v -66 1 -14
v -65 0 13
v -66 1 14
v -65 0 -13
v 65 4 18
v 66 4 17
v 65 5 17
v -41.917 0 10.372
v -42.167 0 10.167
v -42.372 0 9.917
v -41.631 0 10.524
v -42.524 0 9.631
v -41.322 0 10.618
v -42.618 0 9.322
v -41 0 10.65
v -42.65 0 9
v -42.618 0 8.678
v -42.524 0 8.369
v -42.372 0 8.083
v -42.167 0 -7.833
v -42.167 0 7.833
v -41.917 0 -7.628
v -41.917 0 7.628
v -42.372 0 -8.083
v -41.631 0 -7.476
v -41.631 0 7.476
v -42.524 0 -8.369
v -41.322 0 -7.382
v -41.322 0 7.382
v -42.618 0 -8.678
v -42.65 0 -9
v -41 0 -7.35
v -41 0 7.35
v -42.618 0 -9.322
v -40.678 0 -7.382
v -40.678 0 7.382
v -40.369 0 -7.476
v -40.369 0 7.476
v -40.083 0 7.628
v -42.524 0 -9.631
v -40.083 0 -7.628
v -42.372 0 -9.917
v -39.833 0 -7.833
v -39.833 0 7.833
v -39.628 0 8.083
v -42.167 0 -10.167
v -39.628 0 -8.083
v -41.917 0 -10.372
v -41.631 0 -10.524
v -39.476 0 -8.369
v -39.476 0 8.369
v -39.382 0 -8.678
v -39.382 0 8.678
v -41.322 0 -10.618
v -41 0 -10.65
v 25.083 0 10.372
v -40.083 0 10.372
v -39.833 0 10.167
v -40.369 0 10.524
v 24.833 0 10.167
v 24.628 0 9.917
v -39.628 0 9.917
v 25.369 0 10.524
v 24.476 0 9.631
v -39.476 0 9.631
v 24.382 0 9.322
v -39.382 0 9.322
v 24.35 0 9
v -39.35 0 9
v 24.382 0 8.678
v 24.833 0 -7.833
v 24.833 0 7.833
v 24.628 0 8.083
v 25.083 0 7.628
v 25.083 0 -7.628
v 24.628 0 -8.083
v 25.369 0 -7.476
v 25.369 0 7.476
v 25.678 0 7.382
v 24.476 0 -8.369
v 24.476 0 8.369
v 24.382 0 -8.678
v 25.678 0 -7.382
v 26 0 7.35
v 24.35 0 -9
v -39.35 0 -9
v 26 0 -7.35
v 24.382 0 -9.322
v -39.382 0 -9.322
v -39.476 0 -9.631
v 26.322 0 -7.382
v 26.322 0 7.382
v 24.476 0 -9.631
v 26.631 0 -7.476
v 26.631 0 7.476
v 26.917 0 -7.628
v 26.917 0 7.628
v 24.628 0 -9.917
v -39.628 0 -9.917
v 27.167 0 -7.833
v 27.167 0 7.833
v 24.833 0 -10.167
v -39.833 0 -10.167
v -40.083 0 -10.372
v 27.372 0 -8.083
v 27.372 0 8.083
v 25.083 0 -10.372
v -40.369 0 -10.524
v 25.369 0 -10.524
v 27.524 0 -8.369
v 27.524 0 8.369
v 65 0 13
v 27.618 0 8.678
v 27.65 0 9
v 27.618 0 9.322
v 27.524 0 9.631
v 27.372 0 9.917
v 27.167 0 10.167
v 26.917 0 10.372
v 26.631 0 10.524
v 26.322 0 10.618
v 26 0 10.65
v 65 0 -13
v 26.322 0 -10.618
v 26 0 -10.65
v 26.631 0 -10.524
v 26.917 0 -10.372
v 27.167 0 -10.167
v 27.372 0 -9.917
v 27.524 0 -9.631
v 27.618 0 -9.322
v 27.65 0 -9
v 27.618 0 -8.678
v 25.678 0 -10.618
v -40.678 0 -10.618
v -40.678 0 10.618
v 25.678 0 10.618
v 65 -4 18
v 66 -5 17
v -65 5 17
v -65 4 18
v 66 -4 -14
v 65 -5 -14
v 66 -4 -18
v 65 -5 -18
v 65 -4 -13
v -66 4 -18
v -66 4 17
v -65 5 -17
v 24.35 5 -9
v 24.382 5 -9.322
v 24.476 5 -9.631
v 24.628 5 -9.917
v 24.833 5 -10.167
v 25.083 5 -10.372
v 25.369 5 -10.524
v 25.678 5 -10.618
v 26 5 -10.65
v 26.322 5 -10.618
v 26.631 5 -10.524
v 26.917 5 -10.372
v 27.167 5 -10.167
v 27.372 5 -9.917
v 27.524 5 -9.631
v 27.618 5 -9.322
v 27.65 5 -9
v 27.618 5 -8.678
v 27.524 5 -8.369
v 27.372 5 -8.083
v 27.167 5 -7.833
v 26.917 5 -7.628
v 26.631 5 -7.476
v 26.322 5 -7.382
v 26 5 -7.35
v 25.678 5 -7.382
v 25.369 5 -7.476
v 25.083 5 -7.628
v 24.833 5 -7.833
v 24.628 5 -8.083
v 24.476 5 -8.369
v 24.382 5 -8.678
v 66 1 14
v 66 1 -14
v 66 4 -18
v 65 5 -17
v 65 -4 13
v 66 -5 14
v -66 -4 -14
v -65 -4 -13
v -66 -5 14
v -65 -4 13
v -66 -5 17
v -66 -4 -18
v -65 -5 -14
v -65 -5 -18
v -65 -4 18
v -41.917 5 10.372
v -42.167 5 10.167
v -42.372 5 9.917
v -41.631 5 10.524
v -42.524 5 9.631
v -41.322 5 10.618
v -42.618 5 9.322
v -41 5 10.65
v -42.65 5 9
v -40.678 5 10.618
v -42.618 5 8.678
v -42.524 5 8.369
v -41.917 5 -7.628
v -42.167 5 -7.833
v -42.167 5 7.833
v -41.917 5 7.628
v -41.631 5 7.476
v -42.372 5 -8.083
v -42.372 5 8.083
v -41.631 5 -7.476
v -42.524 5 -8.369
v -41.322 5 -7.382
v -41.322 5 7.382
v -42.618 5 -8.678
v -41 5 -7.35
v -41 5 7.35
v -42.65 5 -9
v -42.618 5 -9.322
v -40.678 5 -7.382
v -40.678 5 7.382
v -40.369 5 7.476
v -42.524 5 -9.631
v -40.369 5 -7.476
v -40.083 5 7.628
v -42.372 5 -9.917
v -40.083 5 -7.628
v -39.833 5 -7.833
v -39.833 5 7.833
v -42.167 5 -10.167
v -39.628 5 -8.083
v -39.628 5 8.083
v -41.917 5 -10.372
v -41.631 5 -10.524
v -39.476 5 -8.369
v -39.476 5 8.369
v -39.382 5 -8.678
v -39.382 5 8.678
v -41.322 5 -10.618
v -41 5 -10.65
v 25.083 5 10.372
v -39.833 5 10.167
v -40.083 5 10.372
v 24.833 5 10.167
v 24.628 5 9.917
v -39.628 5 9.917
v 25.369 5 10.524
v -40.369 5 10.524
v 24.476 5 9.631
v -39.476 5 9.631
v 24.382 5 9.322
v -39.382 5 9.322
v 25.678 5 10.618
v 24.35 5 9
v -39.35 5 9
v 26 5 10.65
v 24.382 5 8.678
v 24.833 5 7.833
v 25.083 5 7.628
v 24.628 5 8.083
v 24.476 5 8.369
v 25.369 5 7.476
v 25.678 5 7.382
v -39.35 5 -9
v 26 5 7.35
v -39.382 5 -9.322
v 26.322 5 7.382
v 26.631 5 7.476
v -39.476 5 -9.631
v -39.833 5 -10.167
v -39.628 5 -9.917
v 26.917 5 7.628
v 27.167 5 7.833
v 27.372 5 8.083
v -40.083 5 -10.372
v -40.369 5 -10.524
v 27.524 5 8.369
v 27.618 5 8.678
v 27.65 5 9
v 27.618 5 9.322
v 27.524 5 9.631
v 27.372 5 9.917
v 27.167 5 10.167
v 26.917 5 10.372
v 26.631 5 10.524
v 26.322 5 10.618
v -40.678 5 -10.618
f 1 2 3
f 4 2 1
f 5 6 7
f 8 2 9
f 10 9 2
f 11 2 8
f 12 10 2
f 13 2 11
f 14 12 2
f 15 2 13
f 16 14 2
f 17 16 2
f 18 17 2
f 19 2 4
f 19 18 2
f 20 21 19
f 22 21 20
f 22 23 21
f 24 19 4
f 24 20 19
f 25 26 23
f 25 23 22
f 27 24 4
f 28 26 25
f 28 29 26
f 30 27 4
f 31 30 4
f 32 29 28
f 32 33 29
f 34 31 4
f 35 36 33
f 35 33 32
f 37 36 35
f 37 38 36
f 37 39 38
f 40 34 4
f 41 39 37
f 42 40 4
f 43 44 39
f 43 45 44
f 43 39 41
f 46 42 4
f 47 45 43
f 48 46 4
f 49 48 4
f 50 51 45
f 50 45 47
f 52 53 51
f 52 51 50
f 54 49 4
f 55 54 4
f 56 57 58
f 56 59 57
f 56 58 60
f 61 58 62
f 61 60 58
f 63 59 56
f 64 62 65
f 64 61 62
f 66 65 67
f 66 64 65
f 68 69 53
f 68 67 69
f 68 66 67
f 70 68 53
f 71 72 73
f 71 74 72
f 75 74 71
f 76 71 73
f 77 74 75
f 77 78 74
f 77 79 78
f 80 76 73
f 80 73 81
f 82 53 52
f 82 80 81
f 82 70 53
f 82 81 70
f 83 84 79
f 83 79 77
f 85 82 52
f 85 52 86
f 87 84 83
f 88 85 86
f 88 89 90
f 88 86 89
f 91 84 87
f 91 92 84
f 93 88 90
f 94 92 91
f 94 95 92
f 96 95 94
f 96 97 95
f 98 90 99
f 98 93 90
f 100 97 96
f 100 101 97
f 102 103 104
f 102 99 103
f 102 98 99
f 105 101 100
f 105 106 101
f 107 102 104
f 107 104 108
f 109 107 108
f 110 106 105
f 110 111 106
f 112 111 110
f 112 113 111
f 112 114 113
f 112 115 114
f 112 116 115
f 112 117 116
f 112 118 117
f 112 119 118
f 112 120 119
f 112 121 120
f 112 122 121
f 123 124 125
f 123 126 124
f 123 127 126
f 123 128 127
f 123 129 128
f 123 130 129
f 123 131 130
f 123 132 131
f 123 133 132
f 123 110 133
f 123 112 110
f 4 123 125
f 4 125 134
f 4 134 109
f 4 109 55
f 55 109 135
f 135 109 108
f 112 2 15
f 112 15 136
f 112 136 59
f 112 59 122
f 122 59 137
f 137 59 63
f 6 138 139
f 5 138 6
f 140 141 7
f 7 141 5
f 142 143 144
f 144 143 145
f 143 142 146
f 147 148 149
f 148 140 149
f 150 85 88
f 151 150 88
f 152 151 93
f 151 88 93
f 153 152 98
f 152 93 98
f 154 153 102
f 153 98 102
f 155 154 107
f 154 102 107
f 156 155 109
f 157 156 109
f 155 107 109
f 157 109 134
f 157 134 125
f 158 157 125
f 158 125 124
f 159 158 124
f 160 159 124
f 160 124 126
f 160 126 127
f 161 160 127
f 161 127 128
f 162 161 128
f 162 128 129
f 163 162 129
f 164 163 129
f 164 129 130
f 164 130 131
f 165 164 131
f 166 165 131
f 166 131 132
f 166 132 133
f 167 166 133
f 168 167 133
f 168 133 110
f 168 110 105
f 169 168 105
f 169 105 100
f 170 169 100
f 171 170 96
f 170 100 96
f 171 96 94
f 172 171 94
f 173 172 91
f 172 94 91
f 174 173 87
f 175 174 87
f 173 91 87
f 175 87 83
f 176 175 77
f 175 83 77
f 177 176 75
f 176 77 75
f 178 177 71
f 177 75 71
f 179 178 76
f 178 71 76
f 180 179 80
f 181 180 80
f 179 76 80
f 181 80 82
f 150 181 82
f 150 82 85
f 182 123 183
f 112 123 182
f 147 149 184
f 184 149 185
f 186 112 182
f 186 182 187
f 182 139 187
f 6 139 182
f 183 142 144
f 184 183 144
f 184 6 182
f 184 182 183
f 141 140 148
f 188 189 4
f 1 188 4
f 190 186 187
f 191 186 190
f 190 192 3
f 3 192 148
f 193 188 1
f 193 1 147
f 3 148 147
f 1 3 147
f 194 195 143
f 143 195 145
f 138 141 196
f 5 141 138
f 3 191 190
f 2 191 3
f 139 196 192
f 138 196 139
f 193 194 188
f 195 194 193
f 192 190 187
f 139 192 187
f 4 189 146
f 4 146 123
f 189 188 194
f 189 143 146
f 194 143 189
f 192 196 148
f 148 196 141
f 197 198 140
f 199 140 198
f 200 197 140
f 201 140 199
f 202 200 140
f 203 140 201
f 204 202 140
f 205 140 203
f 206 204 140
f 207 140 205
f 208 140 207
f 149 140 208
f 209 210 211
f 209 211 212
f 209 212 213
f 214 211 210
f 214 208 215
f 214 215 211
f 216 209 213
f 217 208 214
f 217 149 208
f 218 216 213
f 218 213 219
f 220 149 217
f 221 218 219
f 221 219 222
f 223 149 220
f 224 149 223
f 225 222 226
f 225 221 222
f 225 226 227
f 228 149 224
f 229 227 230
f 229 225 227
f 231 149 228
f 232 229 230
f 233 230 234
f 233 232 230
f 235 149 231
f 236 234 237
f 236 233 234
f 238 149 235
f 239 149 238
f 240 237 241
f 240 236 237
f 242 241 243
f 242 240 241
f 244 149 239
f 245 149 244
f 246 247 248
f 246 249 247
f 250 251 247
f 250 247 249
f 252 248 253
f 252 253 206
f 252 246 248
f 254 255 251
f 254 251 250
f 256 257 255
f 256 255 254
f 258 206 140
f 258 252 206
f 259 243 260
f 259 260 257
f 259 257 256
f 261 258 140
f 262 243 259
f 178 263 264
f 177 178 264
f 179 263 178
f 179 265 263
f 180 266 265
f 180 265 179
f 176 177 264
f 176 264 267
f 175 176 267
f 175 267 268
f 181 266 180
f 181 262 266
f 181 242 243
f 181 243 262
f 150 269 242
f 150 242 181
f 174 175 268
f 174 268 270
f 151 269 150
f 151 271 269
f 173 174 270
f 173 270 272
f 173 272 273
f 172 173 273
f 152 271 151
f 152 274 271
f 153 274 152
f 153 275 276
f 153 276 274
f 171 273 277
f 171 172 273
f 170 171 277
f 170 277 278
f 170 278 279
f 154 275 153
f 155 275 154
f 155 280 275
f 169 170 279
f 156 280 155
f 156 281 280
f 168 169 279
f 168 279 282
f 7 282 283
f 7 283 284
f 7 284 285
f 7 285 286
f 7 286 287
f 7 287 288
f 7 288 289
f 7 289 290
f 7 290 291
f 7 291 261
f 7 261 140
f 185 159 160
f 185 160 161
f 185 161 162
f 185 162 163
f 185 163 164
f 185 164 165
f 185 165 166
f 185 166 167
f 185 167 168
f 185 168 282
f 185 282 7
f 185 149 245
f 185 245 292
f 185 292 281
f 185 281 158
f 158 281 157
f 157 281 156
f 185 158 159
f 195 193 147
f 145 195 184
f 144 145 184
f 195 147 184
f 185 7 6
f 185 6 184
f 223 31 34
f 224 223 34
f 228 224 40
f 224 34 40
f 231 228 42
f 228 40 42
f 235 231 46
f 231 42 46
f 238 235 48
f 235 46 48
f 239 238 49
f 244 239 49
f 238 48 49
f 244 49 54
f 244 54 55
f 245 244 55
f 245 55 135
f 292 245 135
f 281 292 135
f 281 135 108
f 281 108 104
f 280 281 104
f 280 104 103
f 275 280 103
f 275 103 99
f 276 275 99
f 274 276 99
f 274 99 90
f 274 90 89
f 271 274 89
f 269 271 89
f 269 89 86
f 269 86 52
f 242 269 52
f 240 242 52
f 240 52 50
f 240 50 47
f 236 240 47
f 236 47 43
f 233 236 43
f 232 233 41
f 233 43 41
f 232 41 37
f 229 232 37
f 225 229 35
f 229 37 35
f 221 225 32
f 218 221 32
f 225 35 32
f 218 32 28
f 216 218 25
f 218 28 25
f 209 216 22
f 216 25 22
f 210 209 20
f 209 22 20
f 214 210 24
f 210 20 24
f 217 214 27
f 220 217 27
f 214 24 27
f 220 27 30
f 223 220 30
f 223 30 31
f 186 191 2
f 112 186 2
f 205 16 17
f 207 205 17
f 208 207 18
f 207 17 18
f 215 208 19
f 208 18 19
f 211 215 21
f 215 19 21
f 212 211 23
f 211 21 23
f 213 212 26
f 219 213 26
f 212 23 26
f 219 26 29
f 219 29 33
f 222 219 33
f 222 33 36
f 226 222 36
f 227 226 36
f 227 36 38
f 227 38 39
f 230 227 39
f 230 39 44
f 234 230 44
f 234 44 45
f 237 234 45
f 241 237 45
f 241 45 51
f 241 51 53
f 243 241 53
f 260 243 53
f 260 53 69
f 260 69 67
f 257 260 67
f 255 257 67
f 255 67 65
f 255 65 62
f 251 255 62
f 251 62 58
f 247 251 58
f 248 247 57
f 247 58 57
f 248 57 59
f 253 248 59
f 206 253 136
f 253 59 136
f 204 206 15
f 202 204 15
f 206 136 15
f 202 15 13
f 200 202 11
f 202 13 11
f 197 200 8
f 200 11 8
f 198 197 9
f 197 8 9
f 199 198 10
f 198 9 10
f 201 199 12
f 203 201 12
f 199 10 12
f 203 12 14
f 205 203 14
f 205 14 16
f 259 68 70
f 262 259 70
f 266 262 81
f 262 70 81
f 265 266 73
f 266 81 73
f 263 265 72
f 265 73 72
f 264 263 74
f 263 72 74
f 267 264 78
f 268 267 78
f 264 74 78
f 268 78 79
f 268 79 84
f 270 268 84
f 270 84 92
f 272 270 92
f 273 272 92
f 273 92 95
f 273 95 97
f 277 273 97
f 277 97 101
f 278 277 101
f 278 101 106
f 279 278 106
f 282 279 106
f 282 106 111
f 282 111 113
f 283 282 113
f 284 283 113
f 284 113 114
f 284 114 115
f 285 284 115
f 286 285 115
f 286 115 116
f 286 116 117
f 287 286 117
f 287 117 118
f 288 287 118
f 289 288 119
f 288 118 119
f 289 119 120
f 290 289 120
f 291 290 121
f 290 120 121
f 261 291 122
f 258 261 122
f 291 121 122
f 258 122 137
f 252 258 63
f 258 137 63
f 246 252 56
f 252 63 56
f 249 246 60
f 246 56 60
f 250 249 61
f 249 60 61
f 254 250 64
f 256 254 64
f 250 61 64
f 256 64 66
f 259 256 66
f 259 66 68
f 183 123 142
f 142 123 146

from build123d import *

# Parameters (mm, degrees)
SKETCH1_W                       = 132
SKETCH1_H                       = 36
BOSS_EXTRUDE1_DEPTH             = 5
SKETCH2_W                       = 26
SKETCH2_H                       = 5
CUT_EXTRUDE1_DEPTH              = 67
CUT_EXTRUDE1_DEPTH_BACK         = 67
CHAMFER1_SIZE                   = 1
TAP_DRILL_FOR_M4X0_7_TAP1_D     = 3.3
TAP_DRILL_FOR_M4X0_7_TAP1_DEPTH = 14
TAP_DRILL_FOR_M4X0_7_TAP1_TIP   = 0.991420021


with BuildPart() as part:
    # Sketch1 → Boss-Extrude1 (new body, symmetric)
    with BuildSketch(Plane(origin=(0, 0, 0), x_dir=(1, 0, 0), z_dir=(0, 1, 0))):
        Rectangle(SKETCH1_W, SKETCH1_H)
    extrude(amount=BOSS_EXTRUDE1_DEPTH, both=True)

    # Sketch2 → Cut-Extrude1 (cut, two sides)
    with BuildSketch(Plane(origin=(0, 0, 0), x_dir=(0, 0, -1), z_dir=(1, 0, 0))) as cut_extrude1_sk:
        with Locations((0, -2.5)):
            Rectangle(SKETCH2_W, SKETCH2_H)
    extrude(amount=CUT_EXTRUDE1_DEPTH, mode=Mode.SUBTRACT)
    extrude(cut_extrude1_sk.sketch, amount=-CUT_EXTRUDE1_DEPTH_BACK, mode=Mode.SUBTRACT)

    # Chamfer1
    chamfer1_edges = [part.edges().sort_by_distance(p)[0] for p in [
        (-66, -2.5, 13),
        (-66, -5, -15.5),
        (-66, 0, 0),
        (-66, -2.5, -13),
        (0, -5, 13),
        (66, -5, -15.5),
        (66, -2.5, -13),
        (66, 0, 0),
        (66, -2.5, 13),
        (0, -5, 18),
        (66, 0, 18),
        (66, 5, 0),
        (0, 5, -18),
        (-66, 5, 0),
        (0, 5, 18),
        (-66, 0, 18),
        (0, -5, -13),
    ]]
    chamfer(chamfer1_edges, length=CHAMFER1_SIZE)

    # Tap Drill for M4x0.7 Tap1
    with Locations(Plane(origin=(-96, 5, 18), x_dir=(1, 0, 0), z_dir=(0, 1, 0))):
        with Locations((55, 27), (122, 27), (55, 9), (122, 9)):
            Hole(TAP_DRILL_FOR_M4X0_7_TAP1_D / 2, depth=TAP_DRILL_FOR_M4X0_7_TAP1_DEPTH)
            with Locations((0, 0, -(TAP_DRILL_FOR_M4X0_7_TAP1_DEPTH + TAP_DRILL_FOR_M4X0_7_TAP1_TIP / 2))):  # 118° drill point
                Cone(0, TAP_DRILL_FOR_M4X0_7_TAP1_D / 2, TAP_DRILL_FOR_M4X0_7_TAP1_TIP, mode=Mode.SUBTRACT)


solid = part.part
